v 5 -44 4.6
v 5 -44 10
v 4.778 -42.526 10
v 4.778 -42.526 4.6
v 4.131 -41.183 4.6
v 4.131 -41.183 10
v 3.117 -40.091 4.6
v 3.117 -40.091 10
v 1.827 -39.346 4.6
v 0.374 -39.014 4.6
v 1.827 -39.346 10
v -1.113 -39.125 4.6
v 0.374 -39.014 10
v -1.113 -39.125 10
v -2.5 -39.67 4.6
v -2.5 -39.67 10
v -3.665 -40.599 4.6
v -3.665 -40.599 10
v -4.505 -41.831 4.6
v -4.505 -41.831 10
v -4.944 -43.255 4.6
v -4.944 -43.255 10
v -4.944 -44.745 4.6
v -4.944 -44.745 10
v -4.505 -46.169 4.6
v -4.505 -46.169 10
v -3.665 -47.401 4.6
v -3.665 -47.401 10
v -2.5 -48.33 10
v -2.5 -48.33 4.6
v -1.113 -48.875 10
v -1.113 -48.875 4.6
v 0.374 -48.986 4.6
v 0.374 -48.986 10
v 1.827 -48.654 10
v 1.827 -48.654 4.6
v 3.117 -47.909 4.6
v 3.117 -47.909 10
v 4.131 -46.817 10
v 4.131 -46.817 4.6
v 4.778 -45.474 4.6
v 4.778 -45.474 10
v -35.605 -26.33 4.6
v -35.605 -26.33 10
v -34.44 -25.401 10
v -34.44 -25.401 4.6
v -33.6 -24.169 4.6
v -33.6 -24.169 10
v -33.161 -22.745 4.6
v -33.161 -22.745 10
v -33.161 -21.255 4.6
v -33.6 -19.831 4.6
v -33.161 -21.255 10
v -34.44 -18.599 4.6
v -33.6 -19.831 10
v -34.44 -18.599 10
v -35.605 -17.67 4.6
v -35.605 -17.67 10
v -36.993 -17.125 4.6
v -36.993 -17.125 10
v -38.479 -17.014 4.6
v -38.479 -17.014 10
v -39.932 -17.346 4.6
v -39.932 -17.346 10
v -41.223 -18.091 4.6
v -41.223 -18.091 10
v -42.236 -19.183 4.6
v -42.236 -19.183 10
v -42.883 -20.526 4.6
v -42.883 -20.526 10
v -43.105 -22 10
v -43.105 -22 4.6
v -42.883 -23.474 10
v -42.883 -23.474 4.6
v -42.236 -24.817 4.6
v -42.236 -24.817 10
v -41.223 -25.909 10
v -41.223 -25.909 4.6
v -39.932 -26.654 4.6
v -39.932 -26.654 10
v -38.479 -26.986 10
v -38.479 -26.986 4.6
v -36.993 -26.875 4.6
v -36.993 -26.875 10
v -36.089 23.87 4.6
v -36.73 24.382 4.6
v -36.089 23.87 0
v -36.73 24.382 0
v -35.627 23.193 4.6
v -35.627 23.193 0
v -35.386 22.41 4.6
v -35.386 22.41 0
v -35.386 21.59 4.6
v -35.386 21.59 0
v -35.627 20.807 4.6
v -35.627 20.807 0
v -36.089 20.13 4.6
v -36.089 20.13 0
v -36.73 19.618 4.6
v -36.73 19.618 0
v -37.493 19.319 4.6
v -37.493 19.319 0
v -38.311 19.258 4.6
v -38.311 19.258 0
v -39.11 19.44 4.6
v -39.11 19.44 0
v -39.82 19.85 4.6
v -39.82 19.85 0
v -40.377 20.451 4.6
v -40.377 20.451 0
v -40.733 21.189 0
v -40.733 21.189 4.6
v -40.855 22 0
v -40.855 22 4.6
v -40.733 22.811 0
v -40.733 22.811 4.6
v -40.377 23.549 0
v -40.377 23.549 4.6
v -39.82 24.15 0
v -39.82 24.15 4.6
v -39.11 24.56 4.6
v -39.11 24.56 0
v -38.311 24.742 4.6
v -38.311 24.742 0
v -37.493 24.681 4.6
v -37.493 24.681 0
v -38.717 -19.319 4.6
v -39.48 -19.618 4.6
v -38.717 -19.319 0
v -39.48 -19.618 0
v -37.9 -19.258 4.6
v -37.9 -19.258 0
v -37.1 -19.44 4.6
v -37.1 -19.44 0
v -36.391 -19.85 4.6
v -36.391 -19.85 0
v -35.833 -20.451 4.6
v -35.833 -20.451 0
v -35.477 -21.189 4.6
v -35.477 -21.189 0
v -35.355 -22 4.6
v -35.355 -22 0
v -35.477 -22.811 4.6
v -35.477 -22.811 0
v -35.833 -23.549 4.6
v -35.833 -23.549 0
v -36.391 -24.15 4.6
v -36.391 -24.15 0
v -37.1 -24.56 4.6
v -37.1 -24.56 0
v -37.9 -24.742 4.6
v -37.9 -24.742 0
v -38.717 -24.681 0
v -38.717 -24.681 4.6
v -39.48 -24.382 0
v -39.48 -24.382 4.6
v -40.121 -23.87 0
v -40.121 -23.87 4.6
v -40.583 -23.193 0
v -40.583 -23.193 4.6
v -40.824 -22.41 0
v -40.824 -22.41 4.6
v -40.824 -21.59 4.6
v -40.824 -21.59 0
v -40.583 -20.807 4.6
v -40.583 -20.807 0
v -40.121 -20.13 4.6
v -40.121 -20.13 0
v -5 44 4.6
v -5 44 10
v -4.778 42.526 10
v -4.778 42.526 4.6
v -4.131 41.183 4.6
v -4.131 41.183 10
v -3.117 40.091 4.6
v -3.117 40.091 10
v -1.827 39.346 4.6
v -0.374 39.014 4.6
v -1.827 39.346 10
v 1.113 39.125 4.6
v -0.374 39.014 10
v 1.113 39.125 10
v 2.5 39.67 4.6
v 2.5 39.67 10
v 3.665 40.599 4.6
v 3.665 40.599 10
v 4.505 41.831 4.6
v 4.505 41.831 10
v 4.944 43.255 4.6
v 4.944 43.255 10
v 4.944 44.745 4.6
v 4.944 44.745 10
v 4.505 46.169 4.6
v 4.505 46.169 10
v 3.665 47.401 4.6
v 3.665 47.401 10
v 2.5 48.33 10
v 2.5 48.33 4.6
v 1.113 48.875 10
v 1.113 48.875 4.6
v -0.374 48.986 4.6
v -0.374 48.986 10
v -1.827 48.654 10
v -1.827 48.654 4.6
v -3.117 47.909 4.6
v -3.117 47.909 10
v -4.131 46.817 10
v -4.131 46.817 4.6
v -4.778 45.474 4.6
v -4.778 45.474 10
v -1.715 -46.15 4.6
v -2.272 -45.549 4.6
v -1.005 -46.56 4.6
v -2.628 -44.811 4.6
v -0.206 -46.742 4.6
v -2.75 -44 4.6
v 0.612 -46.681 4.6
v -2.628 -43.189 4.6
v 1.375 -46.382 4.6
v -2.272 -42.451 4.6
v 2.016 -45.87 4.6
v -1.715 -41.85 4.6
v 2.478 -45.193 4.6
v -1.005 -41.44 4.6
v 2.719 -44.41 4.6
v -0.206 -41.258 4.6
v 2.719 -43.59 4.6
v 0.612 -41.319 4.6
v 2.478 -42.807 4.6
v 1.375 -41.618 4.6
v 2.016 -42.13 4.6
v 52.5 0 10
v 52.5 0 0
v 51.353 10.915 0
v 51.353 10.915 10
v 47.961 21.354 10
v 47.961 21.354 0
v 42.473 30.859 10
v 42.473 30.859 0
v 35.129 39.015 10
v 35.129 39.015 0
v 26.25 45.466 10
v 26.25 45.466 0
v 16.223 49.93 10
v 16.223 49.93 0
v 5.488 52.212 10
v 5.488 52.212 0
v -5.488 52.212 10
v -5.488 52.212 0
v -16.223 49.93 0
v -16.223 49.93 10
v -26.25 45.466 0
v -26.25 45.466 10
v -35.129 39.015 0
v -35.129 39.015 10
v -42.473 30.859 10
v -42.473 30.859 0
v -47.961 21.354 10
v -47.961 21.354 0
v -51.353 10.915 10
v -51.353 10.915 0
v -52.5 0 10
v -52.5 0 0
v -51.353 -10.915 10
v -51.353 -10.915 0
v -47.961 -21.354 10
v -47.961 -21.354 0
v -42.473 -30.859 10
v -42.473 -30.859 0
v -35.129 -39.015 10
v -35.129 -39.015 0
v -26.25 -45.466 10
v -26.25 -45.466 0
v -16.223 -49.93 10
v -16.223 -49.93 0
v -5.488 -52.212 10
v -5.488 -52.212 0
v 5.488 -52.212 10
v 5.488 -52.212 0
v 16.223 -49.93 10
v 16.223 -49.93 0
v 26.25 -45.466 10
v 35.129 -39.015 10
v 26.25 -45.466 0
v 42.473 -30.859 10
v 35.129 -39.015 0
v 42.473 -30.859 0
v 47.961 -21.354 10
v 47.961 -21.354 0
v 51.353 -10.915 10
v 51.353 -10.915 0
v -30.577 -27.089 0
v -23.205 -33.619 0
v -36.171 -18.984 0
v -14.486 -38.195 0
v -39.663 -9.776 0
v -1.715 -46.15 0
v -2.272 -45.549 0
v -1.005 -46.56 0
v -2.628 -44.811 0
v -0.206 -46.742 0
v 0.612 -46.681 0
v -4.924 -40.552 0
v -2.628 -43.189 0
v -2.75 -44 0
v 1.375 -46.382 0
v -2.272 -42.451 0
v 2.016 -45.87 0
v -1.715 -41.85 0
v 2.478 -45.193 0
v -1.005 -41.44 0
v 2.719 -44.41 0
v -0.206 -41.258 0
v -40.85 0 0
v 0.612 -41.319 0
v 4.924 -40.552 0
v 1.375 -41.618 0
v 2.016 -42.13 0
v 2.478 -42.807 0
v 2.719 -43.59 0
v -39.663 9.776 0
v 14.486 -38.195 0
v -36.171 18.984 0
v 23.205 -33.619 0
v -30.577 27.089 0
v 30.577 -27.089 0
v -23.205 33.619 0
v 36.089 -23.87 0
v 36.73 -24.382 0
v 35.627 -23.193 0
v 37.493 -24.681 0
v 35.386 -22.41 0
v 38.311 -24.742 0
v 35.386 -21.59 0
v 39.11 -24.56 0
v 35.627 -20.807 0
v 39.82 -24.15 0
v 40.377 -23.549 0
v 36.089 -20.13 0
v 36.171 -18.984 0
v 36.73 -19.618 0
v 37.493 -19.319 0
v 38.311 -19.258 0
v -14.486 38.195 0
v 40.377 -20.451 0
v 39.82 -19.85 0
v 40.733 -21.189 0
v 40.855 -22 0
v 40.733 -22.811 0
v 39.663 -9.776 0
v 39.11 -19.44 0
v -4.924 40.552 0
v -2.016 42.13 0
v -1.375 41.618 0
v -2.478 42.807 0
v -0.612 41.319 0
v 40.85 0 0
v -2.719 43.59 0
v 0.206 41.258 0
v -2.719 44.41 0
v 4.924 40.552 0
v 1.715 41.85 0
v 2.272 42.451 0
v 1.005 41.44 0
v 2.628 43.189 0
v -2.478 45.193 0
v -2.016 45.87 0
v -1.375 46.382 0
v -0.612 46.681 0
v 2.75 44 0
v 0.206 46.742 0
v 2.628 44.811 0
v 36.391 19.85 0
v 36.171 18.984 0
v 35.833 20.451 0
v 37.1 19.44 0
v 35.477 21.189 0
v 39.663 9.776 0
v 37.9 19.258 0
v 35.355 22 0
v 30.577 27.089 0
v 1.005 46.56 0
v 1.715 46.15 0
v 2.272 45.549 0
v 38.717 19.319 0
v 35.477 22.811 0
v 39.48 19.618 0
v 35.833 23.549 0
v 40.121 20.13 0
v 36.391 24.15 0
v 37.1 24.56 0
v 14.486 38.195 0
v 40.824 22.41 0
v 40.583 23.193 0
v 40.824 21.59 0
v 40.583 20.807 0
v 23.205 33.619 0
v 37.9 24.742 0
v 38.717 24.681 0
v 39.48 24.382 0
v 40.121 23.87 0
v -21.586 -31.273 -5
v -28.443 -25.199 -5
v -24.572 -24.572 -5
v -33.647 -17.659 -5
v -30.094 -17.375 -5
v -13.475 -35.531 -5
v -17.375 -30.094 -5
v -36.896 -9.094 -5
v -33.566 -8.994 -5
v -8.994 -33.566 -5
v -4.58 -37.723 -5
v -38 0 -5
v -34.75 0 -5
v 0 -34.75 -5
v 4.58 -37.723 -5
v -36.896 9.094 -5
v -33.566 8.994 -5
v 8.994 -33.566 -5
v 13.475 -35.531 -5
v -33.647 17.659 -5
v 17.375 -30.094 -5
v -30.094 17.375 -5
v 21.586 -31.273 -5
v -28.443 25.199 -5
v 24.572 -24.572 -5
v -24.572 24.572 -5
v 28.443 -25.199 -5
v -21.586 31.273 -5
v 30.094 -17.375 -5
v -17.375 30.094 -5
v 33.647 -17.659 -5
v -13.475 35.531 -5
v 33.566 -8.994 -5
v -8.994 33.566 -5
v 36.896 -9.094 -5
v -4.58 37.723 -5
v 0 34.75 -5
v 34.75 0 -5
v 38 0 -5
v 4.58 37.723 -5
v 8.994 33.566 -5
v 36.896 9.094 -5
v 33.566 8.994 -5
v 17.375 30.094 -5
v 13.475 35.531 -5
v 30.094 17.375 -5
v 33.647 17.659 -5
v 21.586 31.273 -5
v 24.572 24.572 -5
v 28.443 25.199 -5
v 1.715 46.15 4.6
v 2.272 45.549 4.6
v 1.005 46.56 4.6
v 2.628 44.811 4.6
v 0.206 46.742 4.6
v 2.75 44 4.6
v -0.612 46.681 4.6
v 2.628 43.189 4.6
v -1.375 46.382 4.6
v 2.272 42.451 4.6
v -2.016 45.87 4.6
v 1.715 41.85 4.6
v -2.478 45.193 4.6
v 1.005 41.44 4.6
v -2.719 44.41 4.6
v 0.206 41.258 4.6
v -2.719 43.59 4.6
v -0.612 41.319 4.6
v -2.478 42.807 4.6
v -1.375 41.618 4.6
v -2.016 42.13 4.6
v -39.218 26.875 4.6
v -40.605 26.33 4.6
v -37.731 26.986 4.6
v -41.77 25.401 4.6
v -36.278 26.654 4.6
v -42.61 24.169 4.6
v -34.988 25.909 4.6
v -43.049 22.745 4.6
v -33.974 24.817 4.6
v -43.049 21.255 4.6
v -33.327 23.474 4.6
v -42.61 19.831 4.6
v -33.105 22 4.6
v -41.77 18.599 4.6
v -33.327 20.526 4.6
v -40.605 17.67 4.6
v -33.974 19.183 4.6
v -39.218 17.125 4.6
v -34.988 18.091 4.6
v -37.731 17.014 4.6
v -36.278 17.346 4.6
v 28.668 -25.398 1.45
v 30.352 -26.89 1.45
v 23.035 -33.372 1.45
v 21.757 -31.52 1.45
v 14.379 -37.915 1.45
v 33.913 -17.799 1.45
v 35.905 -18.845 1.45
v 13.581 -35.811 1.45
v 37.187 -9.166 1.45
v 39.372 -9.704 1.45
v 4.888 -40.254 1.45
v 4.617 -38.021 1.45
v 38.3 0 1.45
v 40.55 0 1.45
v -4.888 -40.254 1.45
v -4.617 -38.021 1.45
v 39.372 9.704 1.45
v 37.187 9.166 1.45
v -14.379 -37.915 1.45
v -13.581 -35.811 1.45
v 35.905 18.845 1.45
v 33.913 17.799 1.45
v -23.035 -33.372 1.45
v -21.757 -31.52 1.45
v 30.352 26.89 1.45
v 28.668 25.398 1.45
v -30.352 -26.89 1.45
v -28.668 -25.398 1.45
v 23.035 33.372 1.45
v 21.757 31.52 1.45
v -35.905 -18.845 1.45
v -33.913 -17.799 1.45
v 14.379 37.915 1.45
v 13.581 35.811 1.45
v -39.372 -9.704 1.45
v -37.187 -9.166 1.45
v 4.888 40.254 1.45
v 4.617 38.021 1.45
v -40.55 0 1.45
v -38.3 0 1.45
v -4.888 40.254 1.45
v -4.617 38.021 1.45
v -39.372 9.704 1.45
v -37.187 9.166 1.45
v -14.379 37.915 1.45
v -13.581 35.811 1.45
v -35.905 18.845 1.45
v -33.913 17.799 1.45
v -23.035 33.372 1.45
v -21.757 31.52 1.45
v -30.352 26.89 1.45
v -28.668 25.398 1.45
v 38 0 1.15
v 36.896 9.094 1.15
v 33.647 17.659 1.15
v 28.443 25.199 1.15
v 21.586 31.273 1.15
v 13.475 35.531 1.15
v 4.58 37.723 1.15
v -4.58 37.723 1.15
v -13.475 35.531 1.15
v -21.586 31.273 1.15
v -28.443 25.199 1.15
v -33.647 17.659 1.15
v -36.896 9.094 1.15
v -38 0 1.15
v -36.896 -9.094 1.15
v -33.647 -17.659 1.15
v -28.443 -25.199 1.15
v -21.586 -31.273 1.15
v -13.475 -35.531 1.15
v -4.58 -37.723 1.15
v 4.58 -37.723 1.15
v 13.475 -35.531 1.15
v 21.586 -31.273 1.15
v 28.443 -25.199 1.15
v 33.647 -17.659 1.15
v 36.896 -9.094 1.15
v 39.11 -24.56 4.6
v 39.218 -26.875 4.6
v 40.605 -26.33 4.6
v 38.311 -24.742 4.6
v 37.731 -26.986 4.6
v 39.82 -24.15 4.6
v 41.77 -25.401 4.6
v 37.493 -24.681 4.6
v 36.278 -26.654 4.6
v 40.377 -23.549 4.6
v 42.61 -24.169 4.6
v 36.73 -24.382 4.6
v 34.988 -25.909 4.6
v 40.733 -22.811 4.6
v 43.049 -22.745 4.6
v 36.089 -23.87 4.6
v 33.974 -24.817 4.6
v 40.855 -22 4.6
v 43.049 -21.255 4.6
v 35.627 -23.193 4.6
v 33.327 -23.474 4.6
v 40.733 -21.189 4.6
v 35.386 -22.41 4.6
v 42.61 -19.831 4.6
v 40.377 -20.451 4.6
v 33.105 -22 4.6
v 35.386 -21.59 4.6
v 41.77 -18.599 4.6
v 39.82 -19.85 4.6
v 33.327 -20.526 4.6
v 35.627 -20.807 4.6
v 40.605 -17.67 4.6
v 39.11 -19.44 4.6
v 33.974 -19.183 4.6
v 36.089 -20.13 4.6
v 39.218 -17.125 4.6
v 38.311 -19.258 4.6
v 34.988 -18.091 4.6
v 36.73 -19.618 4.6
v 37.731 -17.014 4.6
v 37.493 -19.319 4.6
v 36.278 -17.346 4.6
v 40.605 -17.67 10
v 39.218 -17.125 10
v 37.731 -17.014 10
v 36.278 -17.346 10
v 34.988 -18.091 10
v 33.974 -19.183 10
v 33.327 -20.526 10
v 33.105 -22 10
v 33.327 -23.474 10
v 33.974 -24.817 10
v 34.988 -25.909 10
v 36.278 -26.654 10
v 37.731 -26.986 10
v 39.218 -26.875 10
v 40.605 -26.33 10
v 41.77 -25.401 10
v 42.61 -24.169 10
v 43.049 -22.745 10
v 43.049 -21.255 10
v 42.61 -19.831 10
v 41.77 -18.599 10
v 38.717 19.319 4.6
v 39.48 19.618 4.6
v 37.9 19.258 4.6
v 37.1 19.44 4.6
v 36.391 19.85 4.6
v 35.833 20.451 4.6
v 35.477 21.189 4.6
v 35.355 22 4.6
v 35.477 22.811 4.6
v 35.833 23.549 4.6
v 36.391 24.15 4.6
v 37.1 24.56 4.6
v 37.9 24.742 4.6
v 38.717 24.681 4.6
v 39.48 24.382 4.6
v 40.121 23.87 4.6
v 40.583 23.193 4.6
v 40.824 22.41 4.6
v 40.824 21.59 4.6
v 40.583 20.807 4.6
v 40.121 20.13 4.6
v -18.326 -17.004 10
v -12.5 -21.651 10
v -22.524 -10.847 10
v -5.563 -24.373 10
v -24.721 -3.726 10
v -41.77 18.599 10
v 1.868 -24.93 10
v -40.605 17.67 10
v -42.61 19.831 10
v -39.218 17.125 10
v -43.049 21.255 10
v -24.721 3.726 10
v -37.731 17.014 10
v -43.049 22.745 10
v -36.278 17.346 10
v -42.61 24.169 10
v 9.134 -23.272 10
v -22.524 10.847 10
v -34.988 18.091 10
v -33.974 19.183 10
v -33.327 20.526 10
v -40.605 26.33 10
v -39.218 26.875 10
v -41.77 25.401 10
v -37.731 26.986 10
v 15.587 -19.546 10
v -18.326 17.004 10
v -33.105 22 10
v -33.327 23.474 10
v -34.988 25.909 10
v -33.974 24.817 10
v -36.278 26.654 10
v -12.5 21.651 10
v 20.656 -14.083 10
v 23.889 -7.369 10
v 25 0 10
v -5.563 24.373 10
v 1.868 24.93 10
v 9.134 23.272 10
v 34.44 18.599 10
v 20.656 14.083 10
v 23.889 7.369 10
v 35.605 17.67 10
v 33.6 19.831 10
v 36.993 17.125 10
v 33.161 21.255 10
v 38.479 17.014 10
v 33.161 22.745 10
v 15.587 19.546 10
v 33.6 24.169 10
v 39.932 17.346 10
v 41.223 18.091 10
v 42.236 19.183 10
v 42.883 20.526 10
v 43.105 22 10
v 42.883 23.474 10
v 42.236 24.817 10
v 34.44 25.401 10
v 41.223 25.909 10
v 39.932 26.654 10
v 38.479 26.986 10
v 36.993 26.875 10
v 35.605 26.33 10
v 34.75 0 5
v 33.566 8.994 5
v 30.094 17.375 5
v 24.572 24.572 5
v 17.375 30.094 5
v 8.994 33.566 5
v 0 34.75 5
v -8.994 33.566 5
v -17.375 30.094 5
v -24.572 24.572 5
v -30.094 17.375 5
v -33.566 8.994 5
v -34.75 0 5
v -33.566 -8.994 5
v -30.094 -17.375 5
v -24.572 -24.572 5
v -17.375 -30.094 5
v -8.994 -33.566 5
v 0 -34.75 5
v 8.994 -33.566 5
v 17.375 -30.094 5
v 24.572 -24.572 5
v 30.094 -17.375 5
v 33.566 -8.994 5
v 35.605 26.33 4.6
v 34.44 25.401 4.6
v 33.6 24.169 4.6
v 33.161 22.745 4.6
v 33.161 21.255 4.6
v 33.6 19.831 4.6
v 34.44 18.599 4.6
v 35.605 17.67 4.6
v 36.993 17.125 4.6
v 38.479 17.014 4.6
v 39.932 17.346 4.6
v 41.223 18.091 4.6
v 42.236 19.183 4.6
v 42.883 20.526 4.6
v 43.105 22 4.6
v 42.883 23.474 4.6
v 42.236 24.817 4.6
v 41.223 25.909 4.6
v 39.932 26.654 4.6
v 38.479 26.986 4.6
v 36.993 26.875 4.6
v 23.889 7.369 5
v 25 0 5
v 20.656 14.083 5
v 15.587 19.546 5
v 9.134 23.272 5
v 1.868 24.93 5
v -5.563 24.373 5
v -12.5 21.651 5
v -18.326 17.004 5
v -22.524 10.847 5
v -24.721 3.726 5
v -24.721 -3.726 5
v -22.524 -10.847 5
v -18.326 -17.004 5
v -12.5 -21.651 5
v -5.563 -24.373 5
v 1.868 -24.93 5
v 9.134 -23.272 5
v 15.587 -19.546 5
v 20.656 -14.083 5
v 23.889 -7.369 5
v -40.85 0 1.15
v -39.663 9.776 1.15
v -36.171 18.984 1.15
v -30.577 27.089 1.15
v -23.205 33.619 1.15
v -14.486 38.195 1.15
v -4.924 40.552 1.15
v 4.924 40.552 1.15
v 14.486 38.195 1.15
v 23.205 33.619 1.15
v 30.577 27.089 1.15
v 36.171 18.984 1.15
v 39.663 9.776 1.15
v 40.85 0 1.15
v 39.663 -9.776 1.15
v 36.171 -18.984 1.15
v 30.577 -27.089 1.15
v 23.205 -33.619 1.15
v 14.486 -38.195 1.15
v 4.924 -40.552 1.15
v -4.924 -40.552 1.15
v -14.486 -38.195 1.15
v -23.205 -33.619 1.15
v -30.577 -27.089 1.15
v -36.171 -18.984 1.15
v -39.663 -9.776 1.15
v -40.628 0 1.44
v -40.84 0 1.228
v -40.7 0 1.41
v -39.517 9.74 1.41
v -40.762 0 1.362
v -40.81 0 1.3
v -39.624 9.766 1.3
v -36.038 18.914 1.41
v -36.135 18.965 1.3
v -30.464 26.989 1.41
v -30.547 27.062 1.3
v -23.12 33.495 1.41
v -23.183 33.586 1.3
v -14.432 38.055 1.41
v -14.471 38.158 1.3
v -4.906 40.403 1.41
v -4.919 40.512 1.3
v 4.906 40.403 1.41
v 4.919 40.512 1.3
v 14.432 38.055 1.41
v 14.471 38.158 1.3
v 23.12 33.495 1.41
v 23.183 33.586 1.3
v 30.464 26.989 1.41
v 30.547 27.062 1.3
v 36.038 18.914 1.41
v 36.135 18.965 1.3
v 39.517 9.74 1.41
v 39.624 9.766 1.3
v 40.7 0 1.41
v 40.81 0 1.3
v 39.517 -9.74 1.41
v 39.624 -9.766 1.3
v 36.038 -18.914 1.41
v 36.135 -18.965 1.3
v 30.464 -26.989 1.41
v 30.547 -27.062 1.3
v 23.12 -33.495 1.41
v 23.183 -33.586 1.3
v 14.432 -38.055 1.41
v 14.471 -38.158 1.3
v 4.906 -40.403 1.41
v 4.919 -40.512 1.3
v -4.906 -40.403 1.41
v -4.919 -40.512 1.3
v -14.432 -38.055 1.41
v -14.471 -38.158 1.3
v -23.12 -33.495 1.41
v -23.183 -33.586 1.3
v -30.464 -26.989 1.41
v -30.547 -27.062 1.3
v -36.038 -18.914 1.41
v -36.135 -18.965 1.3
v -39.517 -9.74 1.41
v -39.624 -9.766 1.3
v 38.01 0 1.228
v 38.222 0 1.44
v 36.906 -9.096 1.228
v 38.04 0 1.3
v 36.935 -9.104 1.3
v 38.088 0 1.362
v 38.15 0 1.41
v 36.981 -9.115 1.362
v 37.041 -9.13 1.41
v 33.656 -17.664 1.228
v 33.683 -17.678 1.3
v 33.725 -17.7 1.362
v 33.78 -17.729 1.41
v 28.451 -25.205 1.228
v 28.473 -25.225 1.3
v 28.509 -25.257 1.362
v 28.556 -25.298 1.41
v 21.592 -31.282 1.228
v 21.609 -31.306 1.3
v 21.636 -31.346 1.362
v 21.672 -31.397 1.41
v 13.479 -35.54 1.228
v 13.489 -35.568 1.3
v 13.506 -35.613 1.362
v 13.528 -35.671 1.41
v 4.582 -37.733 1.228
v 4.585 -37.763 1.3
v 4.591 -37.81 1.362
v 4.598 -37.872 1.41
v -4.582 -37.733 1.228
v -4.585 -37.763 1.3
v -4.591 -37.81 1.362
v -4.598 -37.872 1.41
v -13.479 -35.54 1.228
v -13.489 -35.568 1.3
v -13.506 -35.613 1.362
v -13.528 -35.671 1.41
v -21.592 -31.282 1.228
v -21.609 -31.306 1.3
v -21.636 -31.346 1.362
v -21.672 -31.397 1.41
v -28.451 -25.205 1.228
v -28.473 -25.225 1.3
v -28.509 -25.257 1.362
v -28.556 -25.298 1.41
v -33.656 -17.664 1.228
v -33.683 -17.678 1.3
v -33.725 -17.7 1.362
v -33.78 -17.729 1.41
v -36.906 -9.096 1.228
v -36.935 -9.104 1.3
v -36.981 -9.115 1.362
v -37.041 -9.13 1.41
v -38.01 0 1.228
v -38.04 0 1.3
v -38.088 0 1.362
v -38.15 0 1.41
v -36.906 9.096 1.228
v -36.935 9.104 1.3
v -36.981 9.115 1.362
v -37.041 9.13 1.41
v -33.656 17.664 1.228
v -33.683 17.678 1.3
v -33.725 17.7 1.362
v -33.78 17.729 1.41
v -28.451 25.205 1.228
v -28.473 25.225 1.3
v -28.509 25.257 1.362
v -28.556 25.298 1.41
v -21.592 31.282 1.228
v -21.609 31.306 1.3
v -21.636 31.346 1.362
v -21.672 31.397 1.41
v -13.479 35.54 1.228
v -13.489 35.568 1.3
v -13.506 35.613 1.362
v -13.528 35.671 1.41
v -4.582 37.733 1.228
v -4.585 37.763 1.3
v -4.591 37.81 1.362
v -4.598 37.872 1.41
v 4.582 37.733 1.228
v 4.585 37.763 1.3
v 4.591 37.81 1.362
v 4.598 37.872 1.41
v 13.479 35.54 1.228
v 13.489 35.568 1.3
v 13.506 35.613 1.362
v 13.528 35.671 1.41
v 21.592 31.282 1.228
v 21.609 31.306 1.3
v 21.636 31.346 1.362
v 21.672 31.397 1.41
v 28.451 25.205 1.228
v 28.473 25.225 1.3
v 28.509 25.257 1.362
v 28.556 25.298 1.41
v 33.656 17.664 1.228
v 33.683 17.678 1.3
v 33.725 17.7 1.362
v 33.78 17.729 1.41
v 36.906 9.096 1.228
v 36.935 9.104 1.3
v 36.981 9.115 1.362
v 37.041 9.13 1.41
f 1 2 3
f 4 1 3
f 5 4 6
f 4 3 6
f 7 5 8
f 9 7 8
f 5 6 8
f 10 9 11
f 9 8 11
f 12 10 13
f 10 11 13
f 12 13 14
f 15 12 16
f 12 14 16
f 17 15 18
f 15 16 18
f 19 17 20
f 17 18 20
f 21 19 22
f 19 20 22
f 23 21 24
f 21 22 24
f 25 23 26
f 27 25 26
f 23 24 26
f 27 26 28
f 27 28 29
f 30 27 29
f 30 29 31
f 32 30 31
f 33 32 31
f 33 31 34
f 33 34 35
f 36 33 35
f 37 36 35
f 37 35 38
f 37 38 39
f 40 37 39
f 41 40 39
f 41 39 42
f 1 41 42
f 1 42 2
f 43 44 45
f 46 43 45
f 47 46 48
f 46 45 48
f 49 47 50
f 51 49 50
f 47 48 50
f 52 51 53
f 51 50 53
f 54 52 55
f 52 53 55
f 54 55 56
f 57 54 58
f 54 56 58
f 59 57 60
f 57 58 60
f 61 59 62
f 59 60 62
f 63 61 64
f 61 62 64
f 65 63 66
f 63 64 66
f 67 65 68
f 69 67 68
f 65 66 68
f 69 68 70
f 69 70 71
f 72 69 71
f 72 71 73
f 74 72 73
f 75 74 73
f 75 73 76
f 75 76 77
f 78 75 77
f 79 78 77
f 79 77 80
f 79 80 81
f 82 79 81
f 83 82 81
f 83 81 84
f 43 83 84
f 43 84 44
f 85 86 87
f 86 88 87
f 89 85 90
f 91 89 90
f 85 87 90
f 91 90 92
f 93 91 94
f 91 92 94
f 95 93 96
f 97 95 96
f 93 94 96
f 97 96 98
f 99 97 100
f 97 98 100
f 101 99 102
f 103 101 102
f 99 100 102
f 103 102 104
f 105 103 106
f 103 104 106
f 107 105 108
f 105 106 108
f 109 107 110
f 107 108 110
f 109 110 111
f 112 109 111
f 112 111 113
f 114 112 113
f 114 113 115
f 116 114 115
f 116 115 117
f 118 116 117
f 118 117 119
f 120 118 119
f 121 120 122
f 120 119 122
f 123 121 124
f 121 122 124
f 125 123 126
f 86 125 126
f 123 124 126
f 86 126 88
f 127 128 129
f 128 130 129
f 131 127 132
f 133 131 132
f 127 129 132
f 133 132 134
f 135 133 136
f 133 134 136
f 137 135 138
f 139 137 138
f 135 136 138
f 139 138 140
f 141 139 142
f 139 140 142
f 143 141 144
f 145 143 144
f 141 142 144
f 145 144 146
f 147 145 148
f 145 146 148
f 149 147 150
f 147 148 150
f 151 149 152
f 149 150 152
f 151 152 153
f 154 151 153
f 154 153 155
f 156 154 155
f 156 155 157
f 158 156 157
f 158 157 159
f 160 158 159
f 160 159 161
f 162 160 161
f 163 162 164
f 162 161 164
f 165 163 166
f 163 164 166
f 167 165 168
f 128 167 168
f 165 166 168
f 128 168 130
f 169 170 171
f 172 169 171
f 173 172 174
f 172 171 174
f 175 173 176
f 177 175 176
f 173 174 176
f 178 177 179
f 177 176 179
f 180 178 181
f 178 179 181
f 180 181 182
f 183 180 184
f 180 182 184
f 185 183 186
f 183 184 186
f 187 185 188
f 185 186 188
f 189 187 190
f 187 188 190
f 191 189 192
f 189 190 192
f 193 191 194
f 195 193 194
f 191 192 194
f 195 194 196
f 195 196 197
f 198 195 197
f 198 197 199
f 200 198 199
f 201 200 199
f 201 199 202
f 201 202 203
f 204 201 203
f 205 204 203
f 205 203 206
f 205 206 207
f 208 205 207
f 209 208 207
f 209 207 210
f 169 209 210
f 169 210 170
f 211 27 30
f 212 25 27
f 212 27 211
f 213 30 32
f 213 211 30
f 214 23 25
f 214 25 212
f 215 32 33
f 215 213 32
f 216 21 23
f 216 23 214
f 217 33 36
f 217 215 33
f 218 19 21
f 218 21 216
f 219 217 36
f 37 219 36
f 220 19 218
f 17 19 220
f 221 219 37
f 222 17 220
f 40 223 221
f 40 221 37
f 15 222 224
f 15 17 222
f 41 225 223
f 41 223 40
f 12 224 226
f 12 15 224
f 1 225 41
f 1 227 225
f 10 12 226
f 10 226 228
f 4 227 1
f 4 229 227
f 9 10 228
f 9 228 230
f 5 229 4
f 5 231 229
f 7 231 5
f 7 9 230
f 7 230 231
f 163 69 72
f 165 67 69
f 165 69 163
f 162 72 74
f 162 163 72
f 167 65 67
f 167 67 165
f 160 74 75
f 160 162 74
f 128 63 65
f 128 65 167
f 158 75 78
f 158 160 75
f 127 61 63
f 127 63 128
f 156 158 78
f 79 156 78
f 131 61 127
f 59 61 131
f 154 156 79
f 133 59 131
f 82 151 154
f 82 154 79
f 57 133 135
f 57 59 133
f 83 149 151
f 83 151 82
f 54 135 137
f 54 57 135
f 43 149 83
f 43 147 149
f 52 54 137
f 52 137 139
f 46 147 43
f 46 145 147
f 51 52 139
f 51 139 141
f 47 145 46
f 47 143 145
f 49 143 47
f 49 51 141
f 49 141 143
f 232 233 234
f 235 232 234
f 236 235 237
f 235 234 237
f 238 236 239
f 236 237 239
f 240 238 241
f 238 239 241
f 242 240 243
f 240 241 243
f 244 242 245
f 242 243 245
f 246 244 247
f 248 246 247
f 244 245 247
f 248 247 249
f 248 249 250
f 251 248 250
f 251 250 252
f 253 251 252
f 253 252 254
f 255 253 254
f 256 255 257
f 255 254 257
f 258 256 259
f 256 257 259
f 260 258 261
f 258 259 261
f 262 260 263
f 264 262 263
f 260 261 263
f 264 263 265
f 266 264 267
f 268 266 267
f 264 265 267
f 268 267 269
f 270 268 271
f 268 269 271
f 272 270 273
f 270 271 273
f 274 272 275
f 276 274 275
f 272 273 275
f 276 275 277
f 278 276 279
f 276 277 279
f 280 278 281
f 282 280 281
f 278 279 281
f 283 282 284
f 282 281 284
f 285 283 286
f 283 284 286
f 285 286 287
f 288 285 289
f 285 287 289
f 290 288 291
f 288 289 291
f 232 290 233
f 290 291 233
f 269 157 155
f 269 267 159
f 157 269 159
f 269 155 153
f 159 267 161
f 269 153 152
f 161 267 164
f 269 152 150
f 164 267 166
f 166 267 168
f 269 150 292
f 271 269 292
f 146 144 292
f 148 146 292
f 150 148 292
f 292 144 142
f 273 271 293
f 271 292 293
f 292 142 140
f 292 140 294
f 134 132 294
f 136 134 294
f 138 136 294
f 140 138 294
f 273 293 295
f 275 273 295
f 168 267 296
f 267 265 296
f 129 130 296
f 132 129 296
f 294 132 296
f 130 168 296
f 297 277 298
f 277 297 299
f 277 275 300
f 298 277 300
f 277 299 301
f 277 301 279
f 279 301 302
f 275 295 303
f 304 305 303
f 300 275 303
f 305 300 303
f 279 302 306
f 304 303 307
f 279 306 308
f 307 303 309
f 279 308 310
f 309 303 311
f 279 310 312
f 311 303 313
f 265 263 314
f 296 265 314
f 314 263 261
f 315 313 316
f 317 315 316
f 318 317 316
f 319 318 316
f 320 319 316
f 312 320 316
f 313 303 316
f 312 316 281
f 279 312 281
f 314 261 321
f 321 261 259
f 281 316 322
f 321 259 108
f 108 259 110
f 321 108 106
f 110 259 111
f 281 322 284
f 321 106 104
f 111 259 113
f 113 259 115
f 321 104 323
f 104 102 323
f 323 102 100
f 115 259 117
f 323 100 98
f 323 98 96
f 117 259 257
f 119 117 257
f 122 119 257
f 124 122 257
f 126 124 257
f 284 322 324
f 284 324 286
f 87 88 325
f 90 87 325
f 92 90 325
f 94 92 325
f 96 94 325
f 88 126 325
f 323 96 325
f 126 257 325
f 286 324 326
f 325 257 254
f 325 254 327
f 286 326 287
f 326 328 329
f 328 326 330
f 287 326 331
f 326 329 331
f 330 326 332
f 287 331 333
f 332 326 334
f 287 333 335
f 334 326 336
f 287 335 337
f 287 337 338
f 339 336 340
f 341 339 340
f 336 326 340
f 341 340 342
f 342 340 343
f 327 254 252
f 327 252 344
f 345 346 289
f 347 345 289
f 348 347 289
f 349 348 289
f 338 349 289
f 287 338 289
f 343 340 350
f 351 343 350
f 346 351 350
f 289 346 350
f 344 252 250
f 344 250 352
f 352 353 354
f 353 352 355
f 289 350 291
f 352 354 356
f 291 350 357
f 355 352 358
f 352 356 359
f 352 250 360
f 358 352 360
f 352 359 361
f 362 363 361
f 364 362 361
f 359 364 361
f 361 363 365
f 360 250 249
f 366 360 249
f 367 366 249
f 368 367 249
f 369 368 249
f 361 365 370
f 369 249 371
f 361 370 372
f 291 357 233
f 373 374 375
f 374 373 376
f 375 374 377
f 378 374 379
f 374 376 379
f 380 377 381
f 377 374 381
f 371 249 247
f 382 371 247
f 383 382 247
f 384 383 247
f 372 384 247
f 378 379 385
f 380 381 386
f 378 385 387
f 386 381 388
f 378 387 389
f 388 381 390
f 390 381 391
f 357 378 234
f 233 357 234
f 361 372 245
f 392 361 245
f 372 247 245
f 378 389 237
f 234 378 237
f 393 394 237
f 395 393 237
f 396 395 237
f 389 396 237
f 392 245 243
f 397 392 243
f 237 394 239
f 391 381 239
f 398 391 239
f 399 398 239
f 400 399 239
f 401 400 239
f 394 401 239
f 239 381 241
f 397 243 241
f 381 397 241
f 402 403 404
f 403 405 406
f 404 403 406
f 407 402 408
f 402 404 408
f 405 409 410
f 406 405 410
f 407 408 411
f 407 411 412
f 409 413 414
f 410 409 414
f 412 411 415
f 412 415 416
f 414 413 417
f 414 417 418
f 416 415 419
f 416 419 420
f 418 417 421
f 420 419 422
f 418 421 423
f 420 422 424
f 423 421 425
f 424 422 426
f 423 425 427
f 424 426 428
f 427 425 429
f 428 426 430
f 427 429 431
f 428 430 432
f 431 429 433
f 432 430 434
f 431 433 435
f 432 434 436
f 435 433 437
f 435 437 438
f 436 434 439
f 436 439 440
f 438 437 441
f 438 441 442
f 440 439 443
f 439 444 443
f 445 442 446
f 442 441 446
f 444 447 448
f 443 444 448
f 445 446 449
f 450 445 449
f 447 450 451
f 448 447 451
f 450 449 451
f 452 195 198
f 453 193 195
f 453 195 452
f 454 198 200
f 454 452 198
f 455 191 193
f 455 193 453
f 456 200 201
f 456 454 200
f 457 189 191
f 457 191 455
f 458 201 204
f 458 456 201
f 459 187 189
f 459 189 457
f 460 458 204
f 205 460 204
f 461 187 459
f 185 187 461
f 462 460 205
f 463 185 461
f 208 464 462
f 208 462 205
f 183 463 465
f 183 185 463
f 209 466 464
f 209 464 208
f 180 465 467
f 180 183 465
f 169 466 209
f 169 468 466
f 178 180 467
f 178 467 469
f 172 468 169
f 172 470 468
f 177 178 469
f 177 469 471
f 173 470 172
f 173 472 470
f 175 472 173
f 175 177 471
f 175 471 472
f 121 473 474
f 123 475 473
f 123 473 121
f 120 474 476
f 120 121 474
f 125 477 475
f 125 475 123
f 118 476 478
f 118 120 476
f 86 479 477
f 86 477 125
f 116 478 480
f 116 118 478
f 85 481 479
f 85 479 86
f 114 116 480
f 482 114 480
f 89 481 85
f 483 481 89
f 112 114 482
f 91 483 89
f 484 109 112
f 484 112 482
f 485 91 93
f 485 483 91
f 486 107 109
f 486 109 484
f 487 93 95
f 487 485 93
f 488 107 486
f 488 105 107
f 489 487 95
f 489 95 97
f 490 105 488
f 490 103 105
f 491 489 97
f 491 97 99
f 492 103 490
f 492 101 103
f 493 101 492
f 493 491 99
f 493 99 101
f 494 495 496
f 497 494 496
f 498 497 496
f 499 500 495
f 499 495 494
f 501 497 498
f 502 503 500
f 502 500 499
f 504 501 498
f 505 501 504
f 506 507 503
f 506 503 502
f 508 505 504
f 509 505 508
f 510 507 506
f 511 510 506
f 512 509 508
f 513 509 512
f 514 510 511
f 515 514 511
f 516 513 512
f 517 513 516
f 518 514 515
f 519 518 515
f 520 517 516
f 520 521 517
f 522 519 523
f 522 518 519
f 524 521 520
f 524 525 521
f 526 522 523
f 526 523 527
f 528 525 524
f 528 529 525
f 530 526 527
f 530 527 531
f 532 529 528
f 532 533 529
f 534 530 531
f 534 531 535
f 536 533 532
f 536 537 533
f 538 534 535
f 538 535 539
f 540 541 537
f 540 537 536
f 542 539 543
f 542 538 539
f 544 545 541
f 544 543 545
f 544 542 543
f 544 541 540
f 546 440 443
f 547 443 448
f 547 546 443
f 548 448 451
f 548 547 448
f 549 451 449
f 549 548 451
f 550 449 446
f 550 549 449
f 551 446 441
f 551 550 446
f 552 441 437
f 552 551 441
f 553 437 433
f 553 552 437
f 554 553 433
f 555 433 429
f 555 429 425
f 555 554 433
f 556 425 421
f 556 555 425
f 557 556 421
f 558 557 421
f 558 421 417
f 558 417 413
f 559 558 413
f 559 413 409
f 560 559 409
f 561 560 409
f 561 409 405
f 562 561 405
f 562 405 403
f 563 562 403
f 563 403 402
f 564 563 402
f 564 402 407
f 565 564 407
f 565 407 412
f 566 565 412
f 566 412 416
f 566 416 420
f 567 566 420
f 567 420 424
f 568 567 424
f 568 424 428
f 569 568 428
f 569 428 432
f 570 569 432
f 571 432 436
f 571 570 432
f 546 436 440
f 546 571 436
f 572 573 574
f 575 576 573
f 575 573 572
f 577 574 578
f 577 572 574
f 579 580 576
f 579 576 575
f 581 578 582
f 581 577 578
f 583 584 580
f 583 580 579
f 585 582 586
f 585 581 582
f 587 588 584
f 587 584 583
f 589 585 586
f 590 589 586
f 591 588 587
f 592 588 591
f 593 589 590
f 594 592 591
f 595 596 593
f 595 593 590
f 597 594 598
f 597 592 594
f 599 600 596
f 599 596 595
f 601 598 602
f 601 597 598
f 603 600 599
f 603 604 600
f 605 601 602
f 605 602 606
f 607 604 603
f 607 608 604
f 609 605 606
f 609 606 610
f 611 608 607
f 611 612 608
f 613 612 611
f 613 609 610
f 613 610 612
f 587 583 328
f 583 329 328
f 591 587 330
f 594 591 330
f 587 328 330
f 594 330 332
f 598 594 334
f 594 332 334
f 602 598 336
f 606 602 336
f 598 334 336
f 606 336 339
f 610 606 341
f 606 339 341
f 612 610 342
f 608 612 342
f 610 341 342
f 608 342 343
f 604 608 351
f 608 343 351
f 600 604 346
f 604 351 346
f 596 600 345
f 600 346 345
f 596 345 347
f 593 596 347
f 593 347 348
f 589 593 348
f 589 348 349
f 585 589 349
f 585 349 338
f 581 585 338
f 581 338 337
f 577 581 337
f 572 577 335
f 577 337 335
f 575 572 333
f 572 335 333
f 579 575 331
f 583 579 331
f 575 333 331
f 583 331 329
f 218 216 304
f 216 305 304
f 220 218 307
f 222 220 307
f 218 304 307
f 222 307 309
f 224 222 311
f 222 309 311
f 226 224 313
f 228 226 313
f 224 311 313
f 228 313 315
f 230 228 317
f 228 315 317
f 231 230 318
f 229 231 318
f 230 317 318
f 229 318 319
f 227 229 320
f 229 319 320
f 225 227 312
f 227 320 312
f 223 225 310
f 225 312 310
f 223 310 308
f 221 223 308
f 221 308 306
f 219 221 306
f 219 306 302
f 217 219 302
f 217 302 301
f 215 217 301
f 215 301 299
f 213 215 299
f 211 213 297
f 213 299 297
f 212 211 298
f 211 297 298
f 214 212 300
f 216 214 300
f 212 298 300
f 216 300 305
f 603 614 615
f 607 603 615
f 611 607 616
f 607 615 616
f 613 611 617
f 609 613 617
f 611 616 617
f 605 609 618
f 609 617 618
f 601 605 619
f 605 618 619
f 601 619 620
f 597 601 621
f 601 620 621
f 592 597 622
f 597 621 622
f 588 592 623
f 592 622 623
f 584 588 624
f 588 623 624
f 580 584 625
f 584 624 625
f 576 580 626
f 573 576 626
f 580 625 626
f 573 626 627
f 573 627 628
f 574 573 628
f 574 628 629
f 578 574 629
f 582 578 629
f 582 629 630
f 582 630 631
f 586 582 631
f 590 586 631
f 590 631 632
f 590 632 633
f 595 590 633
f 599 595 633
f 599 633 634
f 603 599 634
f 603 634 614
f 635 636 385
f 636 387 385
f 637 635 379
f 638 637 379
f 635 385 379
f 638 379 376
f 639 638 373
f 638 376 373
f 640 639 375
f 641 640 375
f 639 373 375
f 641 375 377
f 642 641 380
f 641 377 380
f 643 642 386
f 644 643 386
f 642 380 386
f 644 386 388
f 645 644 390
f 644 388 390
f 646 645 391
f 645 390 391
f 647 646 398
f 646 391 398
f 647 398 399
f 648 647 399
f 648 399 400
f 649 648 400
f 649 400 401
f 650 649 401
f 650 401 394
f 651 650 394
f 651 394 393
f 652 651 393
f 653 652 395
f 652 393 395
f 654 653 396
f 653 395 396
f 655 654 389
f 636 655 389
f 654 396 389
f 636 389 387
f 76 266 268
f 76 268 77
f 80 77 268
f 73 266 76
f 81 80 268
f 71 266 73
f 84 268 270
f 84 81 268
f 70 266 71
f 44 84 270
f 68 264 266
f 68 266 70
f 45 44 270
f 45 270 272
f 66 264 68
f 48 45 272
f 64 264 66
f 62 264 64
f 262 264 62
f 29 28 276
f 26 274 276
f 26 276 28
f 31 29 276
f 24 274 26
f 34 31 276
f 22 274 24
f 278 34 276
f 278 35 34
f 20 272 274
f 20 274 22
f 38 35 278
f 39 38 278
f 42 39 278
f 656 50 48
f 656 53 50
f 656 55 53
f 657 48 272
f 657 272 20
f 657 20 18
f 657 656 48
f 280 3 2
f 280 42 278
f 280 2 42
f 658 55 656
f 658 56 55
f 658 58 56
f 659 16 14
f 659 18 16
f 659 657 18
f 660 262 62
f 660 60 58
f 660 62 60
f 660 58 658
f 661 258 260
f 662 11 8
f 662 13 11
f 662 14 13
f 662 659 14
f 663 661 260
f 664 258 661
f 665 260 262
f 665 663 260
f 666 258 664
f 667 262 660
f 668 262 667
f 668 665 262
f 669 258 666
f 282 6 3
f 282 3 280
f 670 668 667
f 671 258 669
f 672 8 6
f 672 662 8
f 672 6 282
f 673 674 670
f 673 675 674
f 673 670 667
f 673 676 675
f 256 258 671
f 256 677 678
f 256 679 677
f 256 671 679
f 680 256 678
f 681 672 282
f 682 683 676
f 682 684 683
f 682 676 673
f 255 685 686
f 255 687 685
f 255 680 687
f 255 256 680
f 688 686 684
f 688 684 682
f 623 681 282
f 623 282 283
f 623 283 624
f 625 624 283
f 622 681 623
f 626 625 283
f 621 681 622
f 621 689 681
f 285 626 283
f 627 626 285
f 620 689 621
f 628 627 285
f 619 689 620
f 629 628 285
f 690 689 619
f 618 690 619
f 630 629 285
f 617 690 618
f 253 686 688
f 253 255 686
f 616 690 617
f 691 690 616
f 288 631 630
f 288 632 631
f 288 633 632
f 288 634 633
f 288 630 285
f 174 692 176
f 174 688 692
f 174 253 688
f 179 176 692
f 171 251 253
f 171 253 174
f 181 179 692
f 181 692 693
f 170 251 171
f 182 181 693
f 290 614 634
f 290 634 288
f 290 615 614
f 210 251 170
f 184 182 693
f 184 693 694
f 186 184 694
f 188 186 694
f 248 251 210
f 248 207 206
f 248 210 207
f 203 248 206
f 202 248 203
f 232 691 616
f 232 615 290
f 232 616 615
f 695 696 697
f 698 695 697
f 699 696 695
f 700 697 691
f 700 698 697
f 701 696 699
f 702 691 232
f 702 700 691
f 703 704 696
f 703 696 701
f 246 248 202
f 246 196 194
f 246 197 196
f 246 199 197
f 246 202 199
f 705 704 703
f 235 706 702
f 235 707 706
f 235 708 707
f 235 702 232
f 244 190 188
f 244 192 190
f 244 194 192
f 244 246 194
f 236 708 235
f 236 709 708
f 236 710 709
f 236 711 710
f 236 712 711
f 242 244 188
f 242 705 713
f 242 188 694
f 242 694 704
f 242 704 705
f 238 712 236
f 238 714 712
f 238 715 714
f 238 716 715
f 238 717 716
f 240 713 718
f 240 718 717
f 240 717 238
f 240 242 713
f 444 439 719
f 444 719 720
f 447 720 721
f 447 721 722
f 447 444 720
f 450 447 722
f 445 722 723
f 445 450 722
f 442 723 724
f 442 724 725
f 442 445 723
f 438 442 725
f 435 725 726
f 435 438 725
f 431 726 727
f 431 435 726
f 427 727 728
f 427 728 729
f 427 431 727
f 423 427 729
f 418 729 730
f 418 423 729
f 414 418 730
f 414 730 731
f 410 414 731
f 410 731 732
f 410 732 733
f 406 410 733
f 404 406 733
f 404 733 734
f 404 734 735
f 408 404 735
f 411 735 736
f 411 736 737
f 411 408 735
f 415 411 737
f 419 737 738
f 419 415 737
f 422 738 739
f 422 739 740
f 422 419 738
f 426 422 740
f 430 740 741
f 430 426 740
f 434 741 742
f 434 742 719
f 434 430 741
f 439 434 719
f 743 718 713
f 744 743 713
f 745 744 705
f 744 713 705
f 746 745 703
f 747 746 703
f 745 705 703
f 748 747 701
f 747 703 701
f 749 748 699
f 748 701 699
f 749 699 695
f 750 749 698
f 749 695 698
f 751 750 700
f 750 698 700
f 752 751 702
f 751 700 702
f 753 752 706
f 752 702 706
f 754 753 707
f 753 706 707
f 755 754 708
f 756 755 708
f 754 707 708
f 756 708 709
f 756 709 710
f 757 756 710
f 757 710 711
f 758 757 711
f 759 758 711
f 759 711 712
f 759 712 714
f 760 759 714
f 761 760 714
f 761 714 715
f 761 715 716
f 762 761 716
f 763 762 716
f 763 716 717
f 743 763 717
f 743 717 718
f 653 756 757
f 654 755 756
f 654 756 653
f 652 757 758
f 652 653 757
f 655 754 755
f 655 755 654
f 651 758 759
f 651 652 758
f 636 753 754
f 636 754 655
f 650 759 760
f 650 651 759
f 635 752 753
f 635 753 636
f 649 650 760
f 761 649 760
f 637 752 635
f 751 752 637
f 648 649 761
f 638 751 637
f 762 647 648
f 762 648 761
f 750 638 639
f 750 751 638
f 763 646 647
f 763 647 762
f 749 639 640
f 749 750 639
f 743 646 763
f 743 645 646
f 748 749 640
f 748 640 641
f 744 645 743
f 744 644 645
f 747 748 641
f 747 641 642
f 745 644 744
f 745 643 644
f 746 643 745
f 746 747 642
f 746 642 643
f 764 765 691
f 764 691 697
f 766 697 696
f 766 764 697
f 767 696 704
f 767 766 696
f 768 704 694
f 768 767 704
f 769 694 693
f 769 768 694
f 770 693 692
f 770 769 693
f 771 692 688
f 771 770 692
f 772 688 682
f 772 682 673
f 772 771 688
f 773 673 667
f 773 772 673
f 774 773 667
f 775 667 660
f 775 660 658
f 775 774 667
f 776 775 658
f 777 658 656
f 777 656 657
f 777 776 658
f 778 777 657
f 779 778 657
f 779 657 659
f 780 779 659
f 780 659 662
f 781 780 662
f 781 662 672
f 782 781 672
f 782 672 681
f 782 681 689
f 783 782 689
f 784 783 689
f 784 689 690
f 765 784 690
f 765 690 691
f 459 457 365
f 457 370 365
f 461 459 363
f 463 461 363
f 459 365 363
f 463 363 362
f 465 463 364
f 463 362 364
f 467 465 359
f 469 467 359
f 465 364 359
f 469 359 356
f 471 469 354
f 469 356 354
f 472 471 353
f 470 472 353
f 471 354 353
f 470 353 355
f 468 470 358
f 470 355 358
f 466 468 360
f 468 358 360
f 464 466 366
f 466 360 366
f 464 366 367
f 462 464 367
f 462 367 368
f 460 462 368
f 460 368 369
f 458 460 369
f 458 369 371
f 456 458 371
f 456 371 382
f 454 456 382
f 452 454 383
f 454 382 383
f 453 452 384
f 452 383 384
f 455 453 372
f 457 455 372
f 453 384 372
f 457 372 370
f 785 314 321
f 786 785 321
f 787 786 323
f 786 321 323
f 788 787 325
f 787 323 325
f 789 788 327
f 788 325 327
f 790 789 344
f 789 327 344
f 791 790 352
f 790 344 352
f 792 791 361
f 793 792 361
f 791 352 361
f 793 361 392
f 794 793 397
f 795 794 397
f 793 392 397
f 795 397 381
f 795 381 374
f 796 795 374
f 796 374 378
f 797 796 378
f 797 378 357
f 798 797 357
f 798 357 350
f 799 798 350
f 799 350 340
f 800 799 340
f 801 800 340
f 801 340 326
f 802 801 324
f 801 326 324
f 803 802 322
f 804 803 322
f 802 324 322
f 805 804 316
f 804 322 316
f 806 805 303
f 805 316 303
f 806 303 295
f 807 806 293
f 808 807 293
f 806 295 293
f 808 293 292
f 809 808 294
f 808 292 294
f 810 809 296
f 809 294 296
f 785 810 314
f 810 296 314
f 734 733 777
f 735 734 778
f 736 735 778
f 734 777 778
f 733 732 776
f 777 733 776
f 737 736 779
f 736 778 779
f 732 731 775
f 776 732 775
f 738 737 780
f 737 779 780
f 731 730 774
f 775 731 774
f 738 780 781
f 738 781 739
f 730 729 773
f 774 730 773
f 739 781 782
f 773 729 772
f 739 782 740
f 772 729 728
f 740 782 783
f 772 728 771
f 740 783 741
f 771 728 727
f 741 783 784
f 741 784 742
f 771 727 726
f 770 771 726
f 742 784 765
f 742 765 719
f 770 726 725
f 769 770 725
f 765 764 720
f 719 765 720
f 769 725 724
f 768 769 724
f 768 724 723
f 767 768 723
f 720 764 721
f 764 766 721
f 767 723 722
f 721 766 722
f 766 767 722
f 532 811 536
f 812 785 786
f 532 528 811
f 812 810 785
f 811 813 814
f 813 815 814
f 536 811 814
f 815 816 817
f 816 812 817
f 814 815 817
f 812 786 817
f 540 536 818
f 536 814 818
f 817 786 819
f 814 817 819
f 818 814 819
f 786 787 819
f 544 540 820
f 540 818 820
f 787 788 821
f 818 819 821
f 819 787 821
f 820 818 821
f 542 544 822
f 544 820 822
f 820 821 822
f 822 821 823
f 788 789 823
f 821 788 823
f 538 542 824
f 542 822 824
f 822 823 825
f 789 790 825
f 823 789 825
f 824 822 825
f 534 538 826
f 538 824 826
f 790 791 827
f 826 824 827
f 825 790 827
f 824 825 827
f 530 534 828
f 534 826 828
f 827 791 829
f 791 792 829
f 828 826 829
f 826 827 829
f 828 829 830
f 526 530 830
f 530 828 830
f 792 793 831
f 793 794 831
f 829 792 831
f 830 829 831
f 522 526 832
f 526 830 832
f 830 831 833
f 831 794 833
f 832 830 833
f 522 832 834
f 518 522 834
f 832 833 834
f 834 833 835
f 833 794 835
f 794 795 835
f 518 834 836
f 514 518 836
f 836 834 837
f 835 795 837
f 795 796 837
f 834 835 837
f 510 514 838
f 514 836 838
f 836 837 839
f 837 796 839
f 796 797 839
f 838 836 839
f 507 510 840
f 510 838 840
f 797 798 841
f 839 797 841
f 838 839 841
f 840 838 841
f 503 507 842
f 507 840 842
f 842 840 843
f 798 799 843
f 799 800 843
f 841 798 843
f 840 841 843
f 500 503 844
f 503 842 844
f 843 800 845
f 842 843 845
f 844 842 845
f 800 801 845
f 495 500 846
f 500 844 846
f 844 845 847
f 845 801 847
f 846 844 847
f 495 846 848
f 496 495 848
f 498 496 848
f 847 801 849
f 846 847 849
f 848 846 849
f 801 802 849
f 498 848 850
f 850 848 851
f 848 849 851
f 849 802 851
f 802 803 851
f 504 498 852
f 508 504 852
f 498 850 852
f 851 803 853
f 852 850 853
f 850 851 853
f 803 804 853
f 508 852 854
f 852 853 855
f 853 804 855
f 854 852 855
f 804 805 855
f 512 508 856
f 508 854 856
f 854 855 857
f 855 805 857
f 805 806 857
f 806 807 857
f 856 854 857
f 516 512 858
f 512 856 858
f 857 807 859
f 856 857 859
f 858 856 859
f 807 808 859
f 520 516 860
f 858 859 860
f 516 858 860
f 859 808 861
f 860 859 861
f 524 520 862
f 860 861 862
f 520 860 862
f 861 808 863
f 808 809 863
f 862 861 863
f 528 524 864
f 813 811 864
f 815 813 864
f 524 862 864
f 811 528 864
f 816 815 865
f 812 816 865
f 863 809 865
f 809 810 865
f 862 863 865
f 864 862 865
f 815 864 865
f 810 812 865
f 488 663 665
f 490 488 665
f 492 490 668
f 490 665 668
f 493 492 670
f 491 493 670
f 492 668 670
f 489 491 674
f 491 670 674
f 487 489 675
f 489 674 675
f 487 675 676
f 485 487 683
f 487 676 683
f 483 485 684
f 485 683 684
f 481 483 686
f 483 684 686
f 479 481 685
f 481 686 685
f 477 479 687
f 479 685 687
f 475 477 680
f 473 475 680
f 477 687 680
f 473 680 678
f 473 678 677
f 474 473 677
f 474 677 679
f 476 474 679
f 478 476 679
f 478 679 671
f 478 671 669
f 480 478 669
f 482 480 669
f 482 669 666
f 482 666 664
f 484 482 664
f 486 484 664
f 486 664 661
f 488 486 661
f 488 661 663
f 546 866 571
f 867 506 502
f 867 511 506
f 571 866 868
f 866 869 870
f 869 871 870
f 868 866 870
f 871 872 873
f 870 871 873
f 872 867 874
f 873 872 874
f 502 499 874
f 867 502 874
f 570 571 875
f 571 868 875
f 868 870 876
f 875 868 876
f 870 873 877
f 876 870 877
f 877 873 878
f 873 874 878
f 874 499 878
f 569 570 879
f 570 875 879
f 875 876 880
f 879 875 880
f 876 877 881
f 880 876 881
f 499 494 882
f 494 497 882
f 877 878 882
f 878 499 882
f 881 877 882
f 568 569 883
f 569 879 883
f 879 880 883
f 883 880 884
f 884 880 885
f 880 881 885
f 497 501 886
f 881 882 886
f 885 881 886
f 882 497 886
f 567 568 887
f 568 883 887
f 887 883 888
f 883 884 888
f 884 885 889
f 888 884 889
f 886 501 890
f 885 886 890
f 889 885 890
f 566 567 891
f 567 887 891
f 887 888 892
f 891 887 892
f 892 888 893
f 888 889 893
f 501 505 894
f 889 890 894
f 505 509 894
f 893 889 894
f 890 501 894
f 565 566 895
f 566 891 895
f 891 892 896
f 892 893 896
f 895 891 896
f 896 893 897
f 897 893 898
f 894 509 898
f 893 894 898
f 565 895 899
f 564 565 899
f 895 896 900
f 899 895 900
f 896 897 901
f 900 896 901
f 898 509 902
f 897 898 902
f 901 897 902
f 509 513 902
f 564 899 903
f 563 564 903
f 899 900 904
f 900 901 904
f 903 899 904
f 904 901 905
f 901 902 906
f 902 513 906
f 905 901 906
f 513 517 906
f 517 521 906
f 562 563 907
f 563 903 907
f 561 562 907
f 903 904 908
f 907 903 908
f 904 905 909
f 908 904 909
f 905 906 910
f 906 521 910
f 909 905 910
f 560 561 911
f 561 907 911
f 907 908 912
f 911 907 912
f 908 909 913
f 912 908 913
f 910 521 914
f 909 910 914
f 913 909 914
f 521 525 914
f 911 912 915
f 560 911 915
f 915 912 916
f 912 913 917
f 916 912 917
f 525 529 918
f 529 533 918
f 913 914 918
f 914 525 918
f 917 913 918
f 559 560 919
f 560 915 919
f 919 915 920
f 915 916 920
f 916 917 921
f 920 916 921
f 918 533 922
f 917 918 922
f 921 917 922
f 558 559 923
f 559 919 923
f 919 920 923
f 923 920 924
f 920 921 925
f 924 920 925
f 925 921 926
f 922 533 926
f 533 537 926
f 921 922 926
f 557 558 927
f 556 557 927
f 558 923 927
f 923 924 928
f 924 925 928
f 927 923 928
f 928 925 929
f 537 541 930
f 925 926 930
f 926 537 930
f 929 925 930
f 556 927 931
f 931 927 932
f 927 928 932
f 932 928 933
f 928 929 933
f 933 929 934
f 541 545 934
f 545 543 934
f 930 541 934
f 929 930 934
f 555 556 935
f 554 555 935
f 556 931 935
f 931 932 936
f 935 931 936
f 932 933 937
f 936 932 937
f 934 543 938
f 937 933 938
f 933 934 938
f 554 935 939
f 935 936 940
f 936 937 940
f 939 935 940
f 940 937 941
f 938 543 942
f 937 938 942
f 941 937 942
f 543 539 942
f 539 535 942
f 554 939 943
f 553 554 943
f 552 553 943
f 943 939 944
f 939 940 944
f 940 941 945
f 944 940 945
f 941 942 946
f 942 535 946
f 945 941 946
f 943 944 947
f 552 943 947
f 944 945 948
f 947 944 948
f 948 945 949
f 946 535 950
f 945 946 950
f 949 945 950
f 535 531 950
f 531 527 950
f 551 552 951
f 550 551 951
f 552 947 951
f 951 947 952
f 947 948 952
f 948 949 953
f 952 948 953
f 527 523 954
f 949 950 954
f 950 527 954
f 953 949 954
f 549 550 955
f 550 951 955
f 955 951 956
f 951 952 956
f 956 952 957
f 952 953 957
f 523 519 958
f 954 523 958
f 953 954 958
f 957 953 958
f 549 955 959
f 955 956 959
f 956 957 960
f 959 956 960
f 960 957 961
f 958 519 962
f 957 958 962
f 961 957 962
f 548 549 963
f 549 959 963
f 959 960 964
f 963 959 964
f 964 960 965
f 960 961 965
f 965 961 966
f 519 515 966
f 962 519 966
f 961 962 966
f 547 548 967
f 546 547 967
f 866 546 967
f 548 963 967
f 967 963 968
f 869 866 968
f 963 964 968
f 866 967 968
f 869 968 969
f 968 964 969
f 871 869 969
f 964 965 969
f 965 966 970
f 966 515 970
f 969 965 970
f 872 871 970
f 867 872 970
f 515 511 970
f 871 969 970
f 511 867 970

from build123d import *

# Parameters (mm, degrees)
SKIZZE1_R                                            = 52.5
AUFSATZ_LINEAR_AUSTRAGEN1_DEPTH                      = 10
SKIZZE2_R                                            = 40
AUFSATZ_LINEAR_AUSTRAGEN3_DEPTH                      = 5
SKIZZE5_OUTSIDE_W                                    = 136.85
SKIZZE5_OUTSIDE_H                                    = 136.85
SKIZZE5_OUTSIDE_R                                    = 35
SCHNITT_LINEAR_AUSTRAGEN1_DEPTH                      = 5
SKIZZE6_R                                            = 38
AUFSATZ_LINEAR_AUSTRAGEN4_DEPTH                      = 5
SCHNITT_LINEAR_START                                 = -5
SKIZZE7_R                                            = 34.75
SCHNITT_LINEAR_AUSTRAGEN2_DEPTH                      = 10
SKIZZE10_R                                           = 25
SCHNITT_LINEAR_AUSTRAGEN4_DEPTH                      = 10
STIRNSENKUNG_F_R_M5_ZYLINDERSCHRAUBE_MIT_D           = 5.5
STIRNSENKUNG_F_R_M5_ZYLINDERSCHRAUBE_MIT_CBORE_D     = 10
STIRNSENKUNG_F_R_M5_ZYLINDERSCHRAUBE_MIT_CBORE_DEPTH = 5.4
KREISMUSTER4_COUNT                                   = 6
SKIZZE16_R                                           = 39
SKIZZE16_R_2                                         = 38
O_RING_NUT_DEPTH                                     = 1
SKIZZE17_R                                           = 40.85
SKIZZE17_R_2                                         = 38
SCHNITT_LINEAR_AUSTRAGEN5_DEPTH                      = 1.45
VERRUNDUNG1_R                                        = 0.3


with BuildPart() as part:
    # Skizze1 → Aufsatz-Linear austragen1 (new body)
    with BuildSketch(Plane.XY):
        Circle(SKIZZE1_R)
    extrude(amount=AUFSATZ_LINEAR_AUSTRAGEN1_DEPTH)

    # Skizze2 → Aufsatz-Linear austragen3 (add)
    with BuildSketch(Plane.XY):
        Circle(SKIZZE2_R)
    extrude(amount=-AUFSATZ_LINEAR_AUSTRAGEN3_DEPTH)

    # Skizze5 outside → Schnitt-Linear austragen1 (cut)
    with BuildSketch(Plane.XY):
        Rectangle(SKIZZE5_OUTSIDE_W, SKIZZE5_OUTSIDE_H)
        Circle(SKIZZE5_OUTSIDE_R, mode=Mode.SUBTRACT)
    extrude(amount=-SCHNITT_LINEAR_AUSTRAGEN1_DEPTH, mode=Mode.SUBTRACT)

    # Skizze6 → Aufsatz-Linear austragen4 (add)
    with BuildSketch(Plane.XY):
        Circle(SKIZZE6_R)
    extrude(amount=-AUFSATZ_LINEAR_AUSTRAGEN4_DEPTH)

    # Skizze7 → Schnitt-Linear austragen2 (cut)
    with BuildSketch(Plane.XY.offset(SCHNITT_LINEAR_START)):
        Circle(SKIZZE7_R)
    extrude(amount=SCHNITT_LINEAR_AUSTRAGEN2_DEPTH, mode=Mode.SUBTRACT)

    # Skizze10 → Schnitt-Linear austragen4 (cut)
    with BuildSketch(Plane.XY):
        Circle(SKIZZE10_R)
    extrude(amount=SCHNITT_LINEAR_AUSTRAGEN4_DEPTH, mode=Mode.SUBTRACT)

    # Stirnsenkung f_r M5 Zylinderschraube mit (through all)
    with Locations(Plane.XY.offset(10)):
        with Locations((0, -44)):
            stirnsenkung_f_r_m5_zylinderschraube_mit = CounterBoreHole(STIRNSENKUNG_F_R_M5_ZYLINDERSCHRAUBE_MIT_D / 2, STIRNSENKUNG_F_R_M5_ZYLINDERSCHRAUBE_MIT_CBORE_D / 2, STIRNSENKUNG_F_R_M5_ZYLINDERSCHRAUBE_MIT_CBORE_DEPTH)

    # Kreismuster4: Stirnsenkung f_r M5 Zylinderschraube mit ×6 about axis
    kreismuster4_axis = Axis((0, 0, 0), (0, 0, 1))
    for i in range(1, KREISMUSTER4_COUNT):
        add(stirnsenkung_f_r_m5_zylinderschraube_mit.rotate(kreismuster4_axis, i * 360 / KREISMUSTER4_COUNT), mode=Mode.SUBTRACT)

    # Skizze16 → o ring nut (cut)
    with BuildSketch(Plane(origin=(0, 0, 0), x_dir=(-1, 0, 0), z_dir=(0, 0, -1))):
        Circle(SKIZZE16_R)
        with Locations(Location((0, 0, 0), (0, 0, 180))):  # turned: the seam where the file's is
            Circle(SKIZZE16_R_2, mode=Mode.SUBTRACT)
    extrude(amount=-O_RING_NUT_DEPTH, mode=Mode.SUBTRACT)

    # Skizze17 → Schnitt-Linear austragen5 (cut)
    with BuildSketch(Plane(origin=(0, 0, 0), x_dir=(-1, 0, 0), z_dir=(0, 0, -1))):
        Circle(SKIZZE17_R)
        with Locations(Location((0, 0, 0), (0, 0, 180))):  # turned: the seam where the file's is
            Circle(SKIZZE17_R_2, mode=Mode.SUBTRACT)
    extrude(amount=-SCHNITT_LINEAR_AUSTRAGEN5_DEPTH, mode=Mode.SUBTRACT)

    # Verrundung1
    verrundung1_edges = [part.edges().sort_by_distance(p)[0] for p in [
        (40.85, 0, 1.45),
        (-38, 0, 1.45),
    ]]
    fillet(verrundung1_edges, radius=VERRUNDUNG1_R)


solid = part.part
